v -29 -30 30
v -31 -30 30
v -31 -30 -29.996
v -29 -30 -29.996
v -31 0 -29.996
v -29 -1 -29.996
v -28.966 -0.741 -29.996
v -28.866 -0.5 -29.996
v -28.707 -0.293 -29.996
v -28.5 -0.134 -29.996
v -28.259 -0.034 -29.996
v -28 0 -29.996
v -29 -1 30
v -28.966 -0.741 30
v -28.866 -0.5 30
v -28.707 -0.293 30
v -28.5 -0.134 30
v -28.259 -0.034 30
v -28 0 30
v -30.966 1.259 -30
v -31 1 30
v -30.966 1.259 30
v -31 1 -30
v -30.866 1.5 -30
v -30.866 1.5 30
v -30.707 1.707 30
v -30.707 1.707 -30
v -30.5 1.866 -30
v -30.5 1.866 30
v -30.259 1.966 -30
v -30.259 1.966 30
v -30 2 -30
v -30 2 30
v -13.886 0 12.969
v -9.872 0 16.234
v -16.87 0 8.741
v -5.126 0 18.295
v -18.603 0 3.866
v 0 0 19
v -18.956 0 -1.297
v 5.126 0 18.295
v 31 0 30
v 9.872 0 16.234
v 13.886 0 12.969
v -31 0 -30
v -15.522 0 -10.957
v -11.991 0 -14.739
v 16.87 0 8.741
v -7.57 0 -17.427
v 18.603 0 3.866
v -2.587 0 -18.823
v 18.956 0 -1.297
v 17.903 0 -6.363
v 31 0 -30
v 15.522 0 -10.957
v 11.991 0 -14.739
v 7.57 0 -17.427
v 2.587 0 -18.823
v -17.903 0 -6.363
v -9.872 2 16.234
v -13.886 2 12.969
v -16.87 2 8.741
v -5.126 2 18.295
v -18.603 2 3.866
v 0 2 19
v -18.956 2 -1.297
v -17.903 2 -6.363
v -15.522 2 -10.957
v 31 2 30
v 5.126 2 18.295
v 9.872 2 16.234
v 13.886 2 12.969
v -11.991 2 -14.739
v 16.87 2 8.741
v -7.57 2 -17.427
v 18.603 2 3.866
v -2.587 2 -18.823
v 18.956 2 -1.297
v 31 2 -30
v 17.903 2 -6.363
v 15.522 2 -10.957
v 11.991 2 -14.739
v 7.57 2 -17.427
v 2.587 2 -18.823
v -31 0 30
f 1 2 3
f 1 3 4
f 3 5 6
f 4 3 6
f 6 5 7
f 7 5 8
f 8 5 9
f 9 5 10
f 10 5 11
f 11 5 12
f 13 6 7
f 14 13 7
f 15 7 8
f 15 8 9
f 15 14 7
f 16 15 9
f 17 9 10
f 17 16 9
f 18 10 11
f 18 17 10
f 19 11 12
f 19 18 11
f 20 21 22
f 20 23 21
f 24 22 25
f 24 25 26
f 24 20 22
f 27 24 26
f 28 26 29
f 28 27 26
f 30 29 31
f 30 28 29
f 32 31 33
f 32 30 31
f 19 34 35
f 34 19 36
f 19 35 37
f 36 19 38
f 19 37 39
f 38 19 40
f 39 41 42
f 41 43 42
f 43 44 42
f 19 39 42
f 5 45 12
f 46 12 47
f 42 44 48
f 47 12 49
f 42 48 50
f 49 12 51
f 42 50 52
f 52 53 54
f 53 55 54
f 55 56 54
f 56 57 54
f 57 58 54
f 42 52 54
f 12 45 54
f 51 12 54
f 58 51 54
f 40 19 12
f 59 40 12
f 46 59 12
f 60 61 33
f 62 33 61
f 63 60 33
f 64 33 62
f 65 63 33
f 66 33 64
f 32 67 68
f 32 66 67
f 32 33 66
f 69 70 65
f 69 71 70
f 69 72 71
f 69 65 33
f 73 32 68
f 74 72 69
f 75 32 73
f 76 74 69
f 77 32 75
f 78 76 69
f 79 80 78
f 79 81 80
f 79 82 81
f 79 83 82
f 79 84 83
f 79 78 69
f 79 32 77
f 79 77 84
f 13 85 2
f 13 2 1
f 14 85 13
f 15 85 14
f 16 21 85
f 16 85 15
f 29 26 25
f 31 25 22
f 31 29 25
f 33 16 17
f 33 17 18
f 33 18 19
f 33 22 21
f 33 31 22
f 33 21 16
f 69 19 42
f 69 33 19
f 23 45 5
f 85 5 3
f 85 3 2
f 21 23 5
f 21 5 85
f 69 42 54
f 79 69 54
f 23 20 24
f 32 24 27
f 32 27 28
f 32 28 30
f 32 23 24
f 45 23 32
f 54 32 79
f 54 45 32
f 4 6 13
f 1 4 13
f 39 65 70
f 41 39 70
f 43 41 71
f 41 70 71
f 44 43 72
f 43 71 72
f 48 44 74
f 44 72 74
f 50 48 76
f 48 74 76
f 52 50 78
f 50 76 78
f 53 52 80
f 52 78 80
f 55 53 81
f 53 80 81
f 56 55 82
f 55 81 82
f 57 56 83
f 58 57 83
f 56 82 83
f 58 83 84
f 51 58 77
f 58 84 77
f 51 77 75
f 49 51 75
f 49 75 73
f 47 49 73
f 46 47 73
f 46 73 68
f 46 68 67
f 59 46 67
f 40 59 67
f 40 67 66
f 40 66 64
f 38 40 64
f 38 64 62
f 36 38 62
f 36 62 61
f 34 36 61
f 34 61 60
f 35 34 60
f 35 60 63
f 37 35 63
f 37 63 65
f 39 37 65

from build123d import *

# Parameters (mm, degrees)
SKETCH1_W           = 62
SKETCH1_H           = 60
BOSS_EXTRUDE1_DEPTH = 2
SKETCH2_W           = 2
SKETCH2_H           = 59.995898743
BOSS_EXTRUDE2_DEPTH = 30
FILLET1_R           = 1
SKETCH3_R           = 19
CUT_EXTRUDE1_DEPTH  = 54.712196008


with BuildPart() as part:
    # Sketch1 → Boss-Extrude1 (new body)
    with BuildSketch(Plane(origin=(0, 0, 0), x_dir=(1, 0, 0), z_dir=(0, 1, 0))):
        Rectangle(SKETCH1_W, SKETCH1_H)
    extrude(amount=BOSS_EXTRUDE1_DEPTH)

    # Sketch2 → Boss-Extrude2 (add)
    with BuildSketch(Plane.XZ):
        with Locations((-30, 0.002050629)):
            Rectangle(SKETCH2_W, SKETCH2_H)
    extrude(amount=BOSS_EXTRUDE2_DEPTH)

    # Fillet1
    fillet1_edges = [part.edges().sort_by_distance(p)[0] for p in [
        (-31, 2, 0),
        (-29, 0, 0.002050628),
    ]]
    fillet(fillet1_edges, radius=FILLET1_R)

    # Sketch3 → Cut-Extrude1 (cut, through all)
    with BuildSketch(Plane(origin=(0, 2, 0), x_dir=(1, 0, 0), z_dir=(0, 1, 0))):
        with Locations(Location((0, 0, 0), (0, 0, 270))):
            Circle(SKETCH3_R)
    extrude(amount=-CUT_EXTRUDE1_DEPTH, mode=Mode.SUBTRACT)


solid = part.part
